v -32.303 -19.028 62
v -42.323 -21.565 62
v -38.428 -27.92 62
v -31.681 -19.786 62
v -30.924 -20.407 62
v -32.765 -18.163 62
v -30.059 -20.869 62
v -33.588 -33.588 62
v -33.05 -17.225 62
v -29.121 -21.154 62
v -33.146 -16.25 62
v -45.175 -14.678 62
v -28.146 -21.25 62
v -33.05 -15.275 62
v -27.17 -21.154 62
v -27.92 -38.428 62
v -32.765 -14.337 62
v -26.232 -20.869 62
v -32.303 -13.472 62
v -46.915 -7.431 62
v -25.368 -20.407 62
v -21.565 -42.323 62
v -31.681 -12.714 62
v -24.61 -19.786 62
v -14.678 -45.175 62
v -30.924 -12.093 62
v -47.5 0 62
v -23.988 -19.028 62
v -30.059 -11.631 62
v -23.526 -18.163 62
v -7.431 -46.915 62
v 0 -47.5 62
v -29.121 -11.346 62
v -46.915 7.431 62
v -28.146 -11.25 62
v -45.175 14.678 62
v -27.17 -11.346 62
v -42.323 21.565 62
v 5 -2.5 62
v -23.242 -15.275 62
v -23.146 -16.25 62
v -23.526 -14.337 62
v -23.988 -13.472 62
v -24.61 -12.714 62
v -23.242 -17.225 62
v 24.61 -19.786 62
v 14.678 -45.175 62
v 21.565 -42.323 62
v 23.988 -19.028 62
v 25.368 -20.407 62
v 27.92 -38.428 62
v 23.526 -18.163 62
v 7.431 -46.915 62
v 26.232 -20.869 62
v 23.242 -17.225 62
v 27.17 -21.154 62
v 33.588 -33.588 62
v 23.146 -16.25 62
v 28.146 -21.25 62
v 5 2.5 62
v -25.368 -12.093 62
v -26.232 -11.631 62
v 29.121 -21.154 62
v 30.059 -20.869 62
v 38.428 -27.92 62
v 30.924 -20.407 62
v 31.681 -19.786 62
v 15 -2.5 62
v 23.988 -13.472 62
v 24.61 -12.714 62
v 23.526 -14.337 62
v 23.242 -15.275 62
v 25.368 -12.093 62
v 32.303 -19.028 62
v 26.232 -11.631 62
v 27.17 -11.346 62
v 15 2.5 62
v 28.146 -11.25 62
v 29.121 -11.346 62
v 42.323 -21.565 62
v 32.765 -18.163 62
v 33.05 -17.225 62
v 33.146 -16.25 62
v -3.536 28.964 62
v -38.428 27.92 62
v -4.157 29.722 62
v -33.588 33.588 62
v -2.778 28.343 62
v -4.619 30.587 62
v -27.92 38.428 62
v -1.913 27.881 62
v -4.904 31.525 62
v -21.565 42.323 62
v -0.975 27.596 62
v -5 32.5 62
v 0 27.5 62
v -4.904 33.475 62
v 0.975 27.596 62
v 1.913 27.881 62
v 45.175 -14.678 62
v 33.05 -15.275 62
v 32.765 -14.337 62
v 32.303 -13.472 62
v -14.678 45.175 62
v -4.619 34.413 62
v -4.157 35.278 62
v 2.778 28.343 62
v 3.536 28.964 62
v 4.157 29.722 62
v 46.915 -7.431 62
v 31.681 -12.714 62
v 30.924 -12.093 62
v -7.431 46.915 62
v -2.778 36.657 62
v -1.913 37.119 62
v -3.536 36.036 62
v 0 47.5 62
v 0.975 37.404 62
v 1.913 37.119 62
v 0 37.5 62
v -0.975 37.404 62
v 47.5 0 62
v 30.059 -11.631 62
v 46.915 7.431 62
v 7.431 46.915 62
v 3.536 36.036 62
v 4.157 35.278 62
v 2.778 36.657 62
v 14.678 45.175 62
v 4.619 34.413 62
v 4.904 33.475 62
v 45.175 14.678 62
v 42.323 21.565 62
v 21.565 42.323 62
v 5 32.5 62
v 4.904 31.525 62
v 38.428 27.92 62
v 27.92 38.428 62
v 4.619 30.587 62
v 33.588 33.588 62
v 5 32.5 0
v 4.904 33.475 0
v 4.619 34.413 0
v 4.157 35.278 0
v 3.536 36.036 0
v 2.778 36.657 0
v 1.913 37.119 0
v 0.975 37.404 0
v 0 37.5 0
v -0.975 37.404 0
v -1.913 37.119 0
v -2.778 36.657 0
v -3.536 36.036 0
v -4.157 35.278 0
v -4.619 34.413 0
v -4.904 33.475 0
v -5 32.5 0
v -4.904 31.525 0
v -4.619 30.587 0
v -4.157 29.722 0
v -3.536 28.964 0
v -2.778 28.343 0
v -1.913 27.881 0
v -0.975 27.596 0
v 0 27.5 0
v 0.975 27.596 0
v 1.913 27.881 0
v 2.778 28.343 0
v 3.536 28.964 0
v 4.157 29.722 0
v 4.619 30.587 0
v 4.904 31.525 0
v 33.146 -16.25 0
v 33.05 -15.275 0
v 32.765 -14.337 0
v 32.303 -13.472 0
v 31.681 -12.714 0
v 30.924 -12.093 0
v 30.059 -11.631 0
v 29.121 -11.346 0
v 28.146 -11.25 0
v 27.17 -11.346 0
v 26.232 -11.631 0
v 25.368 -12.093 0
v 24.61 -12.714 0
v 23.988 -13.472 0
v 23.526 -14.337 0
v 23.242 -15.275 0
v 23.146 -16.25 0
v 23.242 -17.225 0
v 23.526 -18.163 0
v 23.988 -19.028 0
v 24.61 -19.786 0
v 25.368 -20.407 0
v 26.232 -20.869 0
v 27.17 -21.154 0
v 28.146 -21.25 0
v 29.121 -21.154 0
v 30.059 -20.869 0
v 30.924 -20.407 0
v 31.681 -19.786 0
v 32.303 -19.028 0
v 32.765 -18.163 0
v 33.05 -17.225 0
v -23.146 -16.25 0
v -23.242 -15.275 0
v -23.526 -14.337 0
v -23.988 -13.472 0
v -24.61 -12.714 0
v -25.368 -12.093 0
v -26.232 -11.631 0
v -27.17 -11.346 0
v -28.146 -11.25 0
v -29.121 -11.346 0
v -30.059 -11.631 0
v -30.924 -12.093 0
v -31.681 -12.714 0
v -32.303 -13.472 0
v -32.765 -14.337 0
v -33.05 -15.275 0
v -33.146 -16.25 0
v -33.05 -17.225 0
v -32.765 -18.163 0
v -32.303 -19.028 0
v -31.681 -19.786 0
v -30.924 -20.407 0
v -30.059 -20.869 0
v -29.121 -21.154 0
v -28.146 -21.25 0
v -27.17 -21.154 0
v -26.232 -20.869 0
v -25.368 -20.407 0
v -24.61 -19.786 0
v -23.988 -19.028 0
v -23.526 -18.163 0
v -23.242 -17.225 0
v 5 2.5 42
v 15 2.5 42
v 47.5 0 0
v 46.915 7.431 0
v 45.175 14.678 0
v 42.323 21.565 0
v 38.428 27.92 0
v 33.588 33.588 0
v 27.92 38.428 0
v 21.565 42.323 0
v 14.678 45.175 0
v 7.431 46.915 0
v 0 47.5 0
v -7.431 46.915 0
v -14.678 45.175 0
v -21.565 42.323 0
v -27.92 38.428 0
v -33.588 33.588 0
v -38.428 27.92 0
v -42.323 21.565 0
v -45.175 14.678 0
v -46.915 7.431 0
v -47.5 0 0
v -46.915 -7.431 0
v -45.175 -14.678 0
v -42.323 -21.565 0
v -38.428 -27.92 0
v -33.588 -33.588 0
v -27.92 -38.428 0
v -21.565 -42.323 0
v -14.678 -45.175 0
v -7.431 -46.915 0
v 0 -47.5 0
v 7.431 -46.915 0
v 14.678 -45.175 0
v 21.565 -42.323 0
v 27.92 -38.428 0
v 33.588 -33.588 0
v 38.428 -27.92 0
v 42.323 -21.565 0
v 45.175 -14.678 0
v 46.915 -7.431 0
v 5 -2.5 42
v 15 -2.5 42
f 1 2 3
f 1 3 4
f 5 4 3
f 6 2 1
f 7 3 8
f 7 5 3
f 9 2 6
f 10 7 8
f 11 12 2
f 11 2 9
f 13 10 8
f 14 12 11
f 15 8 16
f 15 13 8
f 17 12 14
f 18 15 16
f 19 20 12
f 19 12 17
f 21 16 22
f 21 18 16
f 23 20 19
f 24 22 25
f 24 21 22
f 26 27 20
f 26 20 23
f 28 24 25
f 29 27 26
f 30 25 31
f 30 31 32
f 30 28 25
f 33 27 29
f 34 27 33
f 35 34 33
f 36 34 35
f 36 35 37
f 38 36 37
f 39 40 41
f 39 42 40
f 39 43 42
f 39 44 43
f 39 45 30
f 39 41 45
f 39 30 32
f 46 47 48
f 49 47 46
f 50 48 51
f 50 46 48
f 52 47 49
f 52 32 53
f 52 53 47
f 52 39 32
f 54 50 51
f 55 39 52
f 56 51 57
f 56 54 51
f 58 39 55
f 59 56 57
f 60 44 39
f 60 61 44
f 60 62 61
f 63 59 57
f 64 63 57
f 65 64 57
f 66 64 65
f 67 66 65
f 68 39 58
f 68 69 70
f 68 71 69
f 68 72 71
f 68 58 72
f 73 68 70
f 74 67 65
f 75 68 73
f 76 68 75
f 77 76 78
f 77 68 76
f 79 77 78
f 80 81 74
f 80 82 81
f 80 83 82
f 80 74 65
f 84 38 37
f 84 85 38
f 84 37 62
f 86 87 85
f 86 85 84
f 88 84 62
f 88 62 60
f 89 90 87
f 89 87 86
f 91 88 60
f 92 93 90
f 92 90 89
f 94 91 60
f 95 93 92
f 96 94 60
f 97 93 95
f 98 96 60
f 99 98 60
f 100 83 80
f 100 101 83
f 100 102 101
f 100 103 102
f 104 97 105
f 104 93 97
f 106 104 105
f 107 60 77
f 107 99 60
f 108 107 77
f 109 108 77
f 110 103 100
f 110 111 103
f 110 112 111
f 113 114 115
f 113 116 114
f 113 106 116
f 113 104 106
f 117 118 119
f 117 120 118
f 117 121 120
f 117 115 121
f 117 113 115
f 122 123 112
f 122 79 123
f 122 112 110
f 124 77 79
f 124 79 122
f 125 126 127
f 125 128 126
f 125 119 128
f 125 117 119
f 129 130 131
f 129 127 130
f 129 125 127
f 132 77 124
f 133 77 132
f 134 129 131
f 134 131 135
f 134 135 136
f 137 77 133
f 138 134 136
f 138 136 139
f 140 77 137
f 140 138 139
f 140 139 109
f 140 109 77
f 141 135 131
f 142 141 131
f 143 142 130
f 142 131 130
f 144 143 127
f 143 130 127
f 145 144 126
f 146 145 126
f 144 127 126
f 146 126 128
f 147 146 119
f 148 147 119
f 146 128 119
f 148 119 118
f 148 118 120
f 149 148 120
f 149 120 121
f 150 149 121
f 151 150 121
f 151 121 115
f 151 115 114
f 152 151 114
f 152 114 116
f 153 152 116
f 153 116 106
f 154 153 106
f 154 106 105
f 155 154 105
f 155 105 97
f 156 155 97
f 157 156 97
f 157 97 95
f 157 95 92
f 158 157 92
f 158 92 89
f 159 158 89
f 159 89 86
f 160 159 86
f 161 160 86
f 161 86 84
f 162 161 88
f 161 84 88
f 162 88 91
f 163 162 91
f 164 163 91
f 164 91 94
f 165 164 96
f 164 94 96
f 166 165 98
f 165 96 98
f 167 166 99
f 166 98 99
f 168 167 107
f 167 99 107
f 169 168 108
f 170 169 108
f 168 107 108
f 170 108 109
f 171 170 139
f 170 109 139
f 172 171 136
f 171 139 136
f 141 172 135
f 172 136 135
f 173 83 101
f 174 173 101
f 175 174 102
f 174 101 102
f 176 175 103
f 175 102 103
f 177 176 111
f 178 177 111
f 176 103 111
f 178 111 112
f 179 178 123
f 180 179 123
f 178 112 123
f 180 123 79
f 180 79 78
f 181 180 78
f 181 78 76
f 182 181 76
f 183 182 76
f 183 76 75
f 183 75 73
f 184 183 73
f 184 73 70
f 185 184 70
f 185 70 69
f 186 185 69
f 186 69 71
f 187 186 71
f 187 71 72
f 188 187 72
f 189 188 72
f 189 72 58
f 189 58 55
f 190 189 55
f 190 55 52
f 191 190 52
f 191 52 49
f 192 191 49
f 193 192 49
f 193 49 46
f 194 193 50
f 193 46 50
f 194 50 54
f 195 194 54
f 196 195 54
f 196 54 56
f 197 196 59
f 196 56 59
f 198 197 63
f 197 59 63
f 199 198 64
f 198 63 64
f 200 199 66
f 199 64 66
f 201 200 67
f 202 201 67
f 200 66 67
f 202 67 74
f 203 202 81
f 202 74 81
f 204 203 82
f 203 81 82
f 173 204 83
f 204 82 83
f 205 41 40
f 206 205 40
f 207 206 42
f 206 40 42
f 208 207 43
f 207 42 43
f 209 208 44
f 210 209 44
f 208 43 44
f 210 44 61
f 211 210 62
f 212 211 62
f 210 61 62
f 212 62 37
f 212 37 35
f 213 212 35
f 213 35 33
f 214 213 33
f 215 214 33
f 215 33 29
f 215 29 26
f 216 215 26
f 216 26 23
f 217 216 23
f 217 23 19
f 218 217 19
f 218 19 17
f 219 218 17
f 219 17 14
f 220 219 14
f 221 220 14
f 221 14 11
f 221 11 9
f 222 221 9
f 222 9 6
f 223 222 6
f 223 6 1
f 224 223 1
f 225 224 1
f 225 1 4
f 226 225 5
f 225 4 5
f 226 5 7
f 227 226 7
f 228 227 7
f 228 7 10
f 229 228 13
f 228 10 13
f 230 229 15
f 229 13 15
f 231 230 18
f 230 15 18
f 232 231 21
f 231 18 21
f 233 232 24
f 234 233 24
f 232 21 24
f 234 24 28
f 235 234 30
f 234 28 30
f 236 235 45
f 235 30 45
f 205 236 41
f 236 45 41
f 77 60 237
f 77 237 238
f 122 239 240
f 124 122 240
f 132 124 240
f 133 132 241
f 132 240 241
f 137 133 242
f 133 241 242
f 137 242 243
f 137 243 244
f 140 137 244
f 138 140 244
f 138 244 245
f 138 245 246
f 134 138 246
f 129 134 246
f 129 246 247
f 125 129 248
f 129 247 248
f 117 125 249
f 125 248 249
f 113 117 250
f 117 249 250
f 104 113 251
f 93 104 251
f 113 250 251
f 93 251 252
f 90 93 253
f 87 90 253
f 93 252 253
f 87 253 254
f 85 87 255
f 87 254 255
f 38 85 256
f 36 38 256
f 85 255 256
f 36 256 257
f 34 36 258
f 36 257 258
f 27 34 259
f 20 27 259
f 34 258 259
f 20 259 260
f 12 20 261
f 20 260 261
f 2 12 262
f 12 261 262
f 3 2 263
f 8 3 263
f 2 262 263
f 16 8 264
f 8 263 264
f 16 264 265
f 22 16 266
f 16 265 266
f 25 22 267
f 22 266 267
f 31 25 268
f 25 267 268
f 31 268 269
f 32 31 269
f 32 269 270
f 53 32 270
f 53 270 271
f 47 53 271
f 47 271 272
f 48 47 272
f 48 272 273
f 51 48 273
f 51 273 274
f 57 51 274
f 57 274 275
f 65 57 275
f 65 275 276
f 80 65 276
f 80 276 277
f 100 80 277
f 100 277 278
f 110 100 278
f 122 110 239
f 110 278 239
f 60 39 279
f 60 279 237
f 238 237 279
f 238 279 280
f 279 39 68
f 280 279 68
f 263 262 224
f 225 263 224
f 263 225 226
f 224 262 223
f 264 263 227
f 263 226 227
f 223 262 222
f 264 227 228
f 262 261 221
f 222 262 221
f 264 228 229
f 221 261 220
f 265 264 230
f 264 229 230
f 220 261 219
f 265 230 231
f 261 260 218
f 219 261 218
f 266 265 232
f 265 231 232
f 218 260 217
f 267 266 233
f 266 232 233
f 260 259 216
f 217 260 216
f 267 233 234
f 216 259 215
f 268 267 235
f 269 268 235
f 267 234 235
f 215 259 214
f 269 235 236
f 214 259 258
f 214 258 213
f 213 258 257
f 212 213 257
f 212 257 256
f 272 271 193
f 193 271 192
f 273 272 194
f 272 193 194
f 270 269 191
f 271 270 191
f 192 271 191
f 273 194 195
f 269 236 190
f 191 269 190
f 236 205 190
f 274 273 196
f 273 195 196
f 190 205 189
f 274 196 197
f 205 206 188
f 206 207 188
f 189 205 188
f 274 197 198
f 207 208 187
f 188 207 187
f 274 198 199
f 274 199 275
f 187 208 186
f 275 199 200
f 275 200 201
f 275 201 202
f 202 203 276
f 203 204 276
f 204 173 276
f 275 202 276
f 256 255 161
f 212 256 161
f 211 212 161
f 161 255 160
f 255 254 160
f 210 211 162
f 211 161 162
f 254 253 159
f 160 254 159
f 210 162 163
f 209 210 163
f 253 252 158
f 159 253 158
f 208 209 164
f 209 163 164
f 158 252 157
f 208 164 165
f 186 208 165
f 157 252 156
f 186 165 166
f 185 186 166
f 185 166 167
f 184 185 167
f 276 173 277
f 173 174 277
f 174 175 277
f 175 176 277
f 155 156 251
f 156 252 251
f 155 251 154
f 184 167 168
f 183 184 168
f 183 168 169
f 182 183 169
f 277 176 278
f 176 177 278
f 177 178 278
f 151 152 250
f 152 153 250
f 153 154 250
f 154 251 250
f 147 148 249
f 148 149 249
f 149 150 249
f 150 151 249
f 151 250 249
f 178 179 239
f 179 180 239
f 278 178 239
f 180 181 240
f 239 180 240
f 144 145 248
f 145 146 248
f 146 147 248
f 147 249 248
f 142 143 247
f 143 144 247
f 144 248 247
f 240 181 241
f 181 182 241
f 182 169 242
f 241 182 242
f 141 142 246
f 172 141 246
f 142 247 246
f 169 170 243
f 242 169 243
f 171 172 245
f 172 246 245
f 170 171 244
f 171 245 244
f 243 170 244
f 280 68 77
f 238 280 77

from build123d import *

# Parameters (mm, degrees)
SKETCH1_R           = 47.5
BOSS_EXTRUDE1_DEPTH = 62
SKETCH2_W           = 10
SKETCH2_H           = 5
CUT_EXTRUDE1_DEPTH  = 20
SKETCH3_R           = 5
CUT_EXTRUDE2_DEPTH  = 63


with BuildPart() as part:
    # Sketch1 → Boss-Extrude1 (new body)
    with BuildSketch(Plane.XY):
        Circle(SKETCH1_R)
    extrude(amount=BOSS_EXTRUDE1_DEPTH)

    # Sketch2 → Cut-Extrude1 (cut)
    with BuildSketch(Plane.XY.offset(62)):
        with Locations((10, 0)):
            Rectangle(SKETCH2_W, SKETCH2_H)
    extrude(amount=-CUT_EXTRUDE1_DEPTH, mode=Mode.SUBTRACT)

    # Sketch3 → Cut-Extrude2 (cut, through all)
    with BuildSketch(Plane.XY.offset(62)):
        with Locations((0, 32.5)):
            Circle(SKETCH3_R)
        with Locations((28.145825623, -16.25)):
            Circle(SKETCH3_R)
        with Locations((-28.145825623, -16.25)):
            Circle(SKETCH3_R)
    extrude(amount=-CUT_EXTRUDE2_DEPTH, mode=Mode.SUBTRACT)


solid = part.part
